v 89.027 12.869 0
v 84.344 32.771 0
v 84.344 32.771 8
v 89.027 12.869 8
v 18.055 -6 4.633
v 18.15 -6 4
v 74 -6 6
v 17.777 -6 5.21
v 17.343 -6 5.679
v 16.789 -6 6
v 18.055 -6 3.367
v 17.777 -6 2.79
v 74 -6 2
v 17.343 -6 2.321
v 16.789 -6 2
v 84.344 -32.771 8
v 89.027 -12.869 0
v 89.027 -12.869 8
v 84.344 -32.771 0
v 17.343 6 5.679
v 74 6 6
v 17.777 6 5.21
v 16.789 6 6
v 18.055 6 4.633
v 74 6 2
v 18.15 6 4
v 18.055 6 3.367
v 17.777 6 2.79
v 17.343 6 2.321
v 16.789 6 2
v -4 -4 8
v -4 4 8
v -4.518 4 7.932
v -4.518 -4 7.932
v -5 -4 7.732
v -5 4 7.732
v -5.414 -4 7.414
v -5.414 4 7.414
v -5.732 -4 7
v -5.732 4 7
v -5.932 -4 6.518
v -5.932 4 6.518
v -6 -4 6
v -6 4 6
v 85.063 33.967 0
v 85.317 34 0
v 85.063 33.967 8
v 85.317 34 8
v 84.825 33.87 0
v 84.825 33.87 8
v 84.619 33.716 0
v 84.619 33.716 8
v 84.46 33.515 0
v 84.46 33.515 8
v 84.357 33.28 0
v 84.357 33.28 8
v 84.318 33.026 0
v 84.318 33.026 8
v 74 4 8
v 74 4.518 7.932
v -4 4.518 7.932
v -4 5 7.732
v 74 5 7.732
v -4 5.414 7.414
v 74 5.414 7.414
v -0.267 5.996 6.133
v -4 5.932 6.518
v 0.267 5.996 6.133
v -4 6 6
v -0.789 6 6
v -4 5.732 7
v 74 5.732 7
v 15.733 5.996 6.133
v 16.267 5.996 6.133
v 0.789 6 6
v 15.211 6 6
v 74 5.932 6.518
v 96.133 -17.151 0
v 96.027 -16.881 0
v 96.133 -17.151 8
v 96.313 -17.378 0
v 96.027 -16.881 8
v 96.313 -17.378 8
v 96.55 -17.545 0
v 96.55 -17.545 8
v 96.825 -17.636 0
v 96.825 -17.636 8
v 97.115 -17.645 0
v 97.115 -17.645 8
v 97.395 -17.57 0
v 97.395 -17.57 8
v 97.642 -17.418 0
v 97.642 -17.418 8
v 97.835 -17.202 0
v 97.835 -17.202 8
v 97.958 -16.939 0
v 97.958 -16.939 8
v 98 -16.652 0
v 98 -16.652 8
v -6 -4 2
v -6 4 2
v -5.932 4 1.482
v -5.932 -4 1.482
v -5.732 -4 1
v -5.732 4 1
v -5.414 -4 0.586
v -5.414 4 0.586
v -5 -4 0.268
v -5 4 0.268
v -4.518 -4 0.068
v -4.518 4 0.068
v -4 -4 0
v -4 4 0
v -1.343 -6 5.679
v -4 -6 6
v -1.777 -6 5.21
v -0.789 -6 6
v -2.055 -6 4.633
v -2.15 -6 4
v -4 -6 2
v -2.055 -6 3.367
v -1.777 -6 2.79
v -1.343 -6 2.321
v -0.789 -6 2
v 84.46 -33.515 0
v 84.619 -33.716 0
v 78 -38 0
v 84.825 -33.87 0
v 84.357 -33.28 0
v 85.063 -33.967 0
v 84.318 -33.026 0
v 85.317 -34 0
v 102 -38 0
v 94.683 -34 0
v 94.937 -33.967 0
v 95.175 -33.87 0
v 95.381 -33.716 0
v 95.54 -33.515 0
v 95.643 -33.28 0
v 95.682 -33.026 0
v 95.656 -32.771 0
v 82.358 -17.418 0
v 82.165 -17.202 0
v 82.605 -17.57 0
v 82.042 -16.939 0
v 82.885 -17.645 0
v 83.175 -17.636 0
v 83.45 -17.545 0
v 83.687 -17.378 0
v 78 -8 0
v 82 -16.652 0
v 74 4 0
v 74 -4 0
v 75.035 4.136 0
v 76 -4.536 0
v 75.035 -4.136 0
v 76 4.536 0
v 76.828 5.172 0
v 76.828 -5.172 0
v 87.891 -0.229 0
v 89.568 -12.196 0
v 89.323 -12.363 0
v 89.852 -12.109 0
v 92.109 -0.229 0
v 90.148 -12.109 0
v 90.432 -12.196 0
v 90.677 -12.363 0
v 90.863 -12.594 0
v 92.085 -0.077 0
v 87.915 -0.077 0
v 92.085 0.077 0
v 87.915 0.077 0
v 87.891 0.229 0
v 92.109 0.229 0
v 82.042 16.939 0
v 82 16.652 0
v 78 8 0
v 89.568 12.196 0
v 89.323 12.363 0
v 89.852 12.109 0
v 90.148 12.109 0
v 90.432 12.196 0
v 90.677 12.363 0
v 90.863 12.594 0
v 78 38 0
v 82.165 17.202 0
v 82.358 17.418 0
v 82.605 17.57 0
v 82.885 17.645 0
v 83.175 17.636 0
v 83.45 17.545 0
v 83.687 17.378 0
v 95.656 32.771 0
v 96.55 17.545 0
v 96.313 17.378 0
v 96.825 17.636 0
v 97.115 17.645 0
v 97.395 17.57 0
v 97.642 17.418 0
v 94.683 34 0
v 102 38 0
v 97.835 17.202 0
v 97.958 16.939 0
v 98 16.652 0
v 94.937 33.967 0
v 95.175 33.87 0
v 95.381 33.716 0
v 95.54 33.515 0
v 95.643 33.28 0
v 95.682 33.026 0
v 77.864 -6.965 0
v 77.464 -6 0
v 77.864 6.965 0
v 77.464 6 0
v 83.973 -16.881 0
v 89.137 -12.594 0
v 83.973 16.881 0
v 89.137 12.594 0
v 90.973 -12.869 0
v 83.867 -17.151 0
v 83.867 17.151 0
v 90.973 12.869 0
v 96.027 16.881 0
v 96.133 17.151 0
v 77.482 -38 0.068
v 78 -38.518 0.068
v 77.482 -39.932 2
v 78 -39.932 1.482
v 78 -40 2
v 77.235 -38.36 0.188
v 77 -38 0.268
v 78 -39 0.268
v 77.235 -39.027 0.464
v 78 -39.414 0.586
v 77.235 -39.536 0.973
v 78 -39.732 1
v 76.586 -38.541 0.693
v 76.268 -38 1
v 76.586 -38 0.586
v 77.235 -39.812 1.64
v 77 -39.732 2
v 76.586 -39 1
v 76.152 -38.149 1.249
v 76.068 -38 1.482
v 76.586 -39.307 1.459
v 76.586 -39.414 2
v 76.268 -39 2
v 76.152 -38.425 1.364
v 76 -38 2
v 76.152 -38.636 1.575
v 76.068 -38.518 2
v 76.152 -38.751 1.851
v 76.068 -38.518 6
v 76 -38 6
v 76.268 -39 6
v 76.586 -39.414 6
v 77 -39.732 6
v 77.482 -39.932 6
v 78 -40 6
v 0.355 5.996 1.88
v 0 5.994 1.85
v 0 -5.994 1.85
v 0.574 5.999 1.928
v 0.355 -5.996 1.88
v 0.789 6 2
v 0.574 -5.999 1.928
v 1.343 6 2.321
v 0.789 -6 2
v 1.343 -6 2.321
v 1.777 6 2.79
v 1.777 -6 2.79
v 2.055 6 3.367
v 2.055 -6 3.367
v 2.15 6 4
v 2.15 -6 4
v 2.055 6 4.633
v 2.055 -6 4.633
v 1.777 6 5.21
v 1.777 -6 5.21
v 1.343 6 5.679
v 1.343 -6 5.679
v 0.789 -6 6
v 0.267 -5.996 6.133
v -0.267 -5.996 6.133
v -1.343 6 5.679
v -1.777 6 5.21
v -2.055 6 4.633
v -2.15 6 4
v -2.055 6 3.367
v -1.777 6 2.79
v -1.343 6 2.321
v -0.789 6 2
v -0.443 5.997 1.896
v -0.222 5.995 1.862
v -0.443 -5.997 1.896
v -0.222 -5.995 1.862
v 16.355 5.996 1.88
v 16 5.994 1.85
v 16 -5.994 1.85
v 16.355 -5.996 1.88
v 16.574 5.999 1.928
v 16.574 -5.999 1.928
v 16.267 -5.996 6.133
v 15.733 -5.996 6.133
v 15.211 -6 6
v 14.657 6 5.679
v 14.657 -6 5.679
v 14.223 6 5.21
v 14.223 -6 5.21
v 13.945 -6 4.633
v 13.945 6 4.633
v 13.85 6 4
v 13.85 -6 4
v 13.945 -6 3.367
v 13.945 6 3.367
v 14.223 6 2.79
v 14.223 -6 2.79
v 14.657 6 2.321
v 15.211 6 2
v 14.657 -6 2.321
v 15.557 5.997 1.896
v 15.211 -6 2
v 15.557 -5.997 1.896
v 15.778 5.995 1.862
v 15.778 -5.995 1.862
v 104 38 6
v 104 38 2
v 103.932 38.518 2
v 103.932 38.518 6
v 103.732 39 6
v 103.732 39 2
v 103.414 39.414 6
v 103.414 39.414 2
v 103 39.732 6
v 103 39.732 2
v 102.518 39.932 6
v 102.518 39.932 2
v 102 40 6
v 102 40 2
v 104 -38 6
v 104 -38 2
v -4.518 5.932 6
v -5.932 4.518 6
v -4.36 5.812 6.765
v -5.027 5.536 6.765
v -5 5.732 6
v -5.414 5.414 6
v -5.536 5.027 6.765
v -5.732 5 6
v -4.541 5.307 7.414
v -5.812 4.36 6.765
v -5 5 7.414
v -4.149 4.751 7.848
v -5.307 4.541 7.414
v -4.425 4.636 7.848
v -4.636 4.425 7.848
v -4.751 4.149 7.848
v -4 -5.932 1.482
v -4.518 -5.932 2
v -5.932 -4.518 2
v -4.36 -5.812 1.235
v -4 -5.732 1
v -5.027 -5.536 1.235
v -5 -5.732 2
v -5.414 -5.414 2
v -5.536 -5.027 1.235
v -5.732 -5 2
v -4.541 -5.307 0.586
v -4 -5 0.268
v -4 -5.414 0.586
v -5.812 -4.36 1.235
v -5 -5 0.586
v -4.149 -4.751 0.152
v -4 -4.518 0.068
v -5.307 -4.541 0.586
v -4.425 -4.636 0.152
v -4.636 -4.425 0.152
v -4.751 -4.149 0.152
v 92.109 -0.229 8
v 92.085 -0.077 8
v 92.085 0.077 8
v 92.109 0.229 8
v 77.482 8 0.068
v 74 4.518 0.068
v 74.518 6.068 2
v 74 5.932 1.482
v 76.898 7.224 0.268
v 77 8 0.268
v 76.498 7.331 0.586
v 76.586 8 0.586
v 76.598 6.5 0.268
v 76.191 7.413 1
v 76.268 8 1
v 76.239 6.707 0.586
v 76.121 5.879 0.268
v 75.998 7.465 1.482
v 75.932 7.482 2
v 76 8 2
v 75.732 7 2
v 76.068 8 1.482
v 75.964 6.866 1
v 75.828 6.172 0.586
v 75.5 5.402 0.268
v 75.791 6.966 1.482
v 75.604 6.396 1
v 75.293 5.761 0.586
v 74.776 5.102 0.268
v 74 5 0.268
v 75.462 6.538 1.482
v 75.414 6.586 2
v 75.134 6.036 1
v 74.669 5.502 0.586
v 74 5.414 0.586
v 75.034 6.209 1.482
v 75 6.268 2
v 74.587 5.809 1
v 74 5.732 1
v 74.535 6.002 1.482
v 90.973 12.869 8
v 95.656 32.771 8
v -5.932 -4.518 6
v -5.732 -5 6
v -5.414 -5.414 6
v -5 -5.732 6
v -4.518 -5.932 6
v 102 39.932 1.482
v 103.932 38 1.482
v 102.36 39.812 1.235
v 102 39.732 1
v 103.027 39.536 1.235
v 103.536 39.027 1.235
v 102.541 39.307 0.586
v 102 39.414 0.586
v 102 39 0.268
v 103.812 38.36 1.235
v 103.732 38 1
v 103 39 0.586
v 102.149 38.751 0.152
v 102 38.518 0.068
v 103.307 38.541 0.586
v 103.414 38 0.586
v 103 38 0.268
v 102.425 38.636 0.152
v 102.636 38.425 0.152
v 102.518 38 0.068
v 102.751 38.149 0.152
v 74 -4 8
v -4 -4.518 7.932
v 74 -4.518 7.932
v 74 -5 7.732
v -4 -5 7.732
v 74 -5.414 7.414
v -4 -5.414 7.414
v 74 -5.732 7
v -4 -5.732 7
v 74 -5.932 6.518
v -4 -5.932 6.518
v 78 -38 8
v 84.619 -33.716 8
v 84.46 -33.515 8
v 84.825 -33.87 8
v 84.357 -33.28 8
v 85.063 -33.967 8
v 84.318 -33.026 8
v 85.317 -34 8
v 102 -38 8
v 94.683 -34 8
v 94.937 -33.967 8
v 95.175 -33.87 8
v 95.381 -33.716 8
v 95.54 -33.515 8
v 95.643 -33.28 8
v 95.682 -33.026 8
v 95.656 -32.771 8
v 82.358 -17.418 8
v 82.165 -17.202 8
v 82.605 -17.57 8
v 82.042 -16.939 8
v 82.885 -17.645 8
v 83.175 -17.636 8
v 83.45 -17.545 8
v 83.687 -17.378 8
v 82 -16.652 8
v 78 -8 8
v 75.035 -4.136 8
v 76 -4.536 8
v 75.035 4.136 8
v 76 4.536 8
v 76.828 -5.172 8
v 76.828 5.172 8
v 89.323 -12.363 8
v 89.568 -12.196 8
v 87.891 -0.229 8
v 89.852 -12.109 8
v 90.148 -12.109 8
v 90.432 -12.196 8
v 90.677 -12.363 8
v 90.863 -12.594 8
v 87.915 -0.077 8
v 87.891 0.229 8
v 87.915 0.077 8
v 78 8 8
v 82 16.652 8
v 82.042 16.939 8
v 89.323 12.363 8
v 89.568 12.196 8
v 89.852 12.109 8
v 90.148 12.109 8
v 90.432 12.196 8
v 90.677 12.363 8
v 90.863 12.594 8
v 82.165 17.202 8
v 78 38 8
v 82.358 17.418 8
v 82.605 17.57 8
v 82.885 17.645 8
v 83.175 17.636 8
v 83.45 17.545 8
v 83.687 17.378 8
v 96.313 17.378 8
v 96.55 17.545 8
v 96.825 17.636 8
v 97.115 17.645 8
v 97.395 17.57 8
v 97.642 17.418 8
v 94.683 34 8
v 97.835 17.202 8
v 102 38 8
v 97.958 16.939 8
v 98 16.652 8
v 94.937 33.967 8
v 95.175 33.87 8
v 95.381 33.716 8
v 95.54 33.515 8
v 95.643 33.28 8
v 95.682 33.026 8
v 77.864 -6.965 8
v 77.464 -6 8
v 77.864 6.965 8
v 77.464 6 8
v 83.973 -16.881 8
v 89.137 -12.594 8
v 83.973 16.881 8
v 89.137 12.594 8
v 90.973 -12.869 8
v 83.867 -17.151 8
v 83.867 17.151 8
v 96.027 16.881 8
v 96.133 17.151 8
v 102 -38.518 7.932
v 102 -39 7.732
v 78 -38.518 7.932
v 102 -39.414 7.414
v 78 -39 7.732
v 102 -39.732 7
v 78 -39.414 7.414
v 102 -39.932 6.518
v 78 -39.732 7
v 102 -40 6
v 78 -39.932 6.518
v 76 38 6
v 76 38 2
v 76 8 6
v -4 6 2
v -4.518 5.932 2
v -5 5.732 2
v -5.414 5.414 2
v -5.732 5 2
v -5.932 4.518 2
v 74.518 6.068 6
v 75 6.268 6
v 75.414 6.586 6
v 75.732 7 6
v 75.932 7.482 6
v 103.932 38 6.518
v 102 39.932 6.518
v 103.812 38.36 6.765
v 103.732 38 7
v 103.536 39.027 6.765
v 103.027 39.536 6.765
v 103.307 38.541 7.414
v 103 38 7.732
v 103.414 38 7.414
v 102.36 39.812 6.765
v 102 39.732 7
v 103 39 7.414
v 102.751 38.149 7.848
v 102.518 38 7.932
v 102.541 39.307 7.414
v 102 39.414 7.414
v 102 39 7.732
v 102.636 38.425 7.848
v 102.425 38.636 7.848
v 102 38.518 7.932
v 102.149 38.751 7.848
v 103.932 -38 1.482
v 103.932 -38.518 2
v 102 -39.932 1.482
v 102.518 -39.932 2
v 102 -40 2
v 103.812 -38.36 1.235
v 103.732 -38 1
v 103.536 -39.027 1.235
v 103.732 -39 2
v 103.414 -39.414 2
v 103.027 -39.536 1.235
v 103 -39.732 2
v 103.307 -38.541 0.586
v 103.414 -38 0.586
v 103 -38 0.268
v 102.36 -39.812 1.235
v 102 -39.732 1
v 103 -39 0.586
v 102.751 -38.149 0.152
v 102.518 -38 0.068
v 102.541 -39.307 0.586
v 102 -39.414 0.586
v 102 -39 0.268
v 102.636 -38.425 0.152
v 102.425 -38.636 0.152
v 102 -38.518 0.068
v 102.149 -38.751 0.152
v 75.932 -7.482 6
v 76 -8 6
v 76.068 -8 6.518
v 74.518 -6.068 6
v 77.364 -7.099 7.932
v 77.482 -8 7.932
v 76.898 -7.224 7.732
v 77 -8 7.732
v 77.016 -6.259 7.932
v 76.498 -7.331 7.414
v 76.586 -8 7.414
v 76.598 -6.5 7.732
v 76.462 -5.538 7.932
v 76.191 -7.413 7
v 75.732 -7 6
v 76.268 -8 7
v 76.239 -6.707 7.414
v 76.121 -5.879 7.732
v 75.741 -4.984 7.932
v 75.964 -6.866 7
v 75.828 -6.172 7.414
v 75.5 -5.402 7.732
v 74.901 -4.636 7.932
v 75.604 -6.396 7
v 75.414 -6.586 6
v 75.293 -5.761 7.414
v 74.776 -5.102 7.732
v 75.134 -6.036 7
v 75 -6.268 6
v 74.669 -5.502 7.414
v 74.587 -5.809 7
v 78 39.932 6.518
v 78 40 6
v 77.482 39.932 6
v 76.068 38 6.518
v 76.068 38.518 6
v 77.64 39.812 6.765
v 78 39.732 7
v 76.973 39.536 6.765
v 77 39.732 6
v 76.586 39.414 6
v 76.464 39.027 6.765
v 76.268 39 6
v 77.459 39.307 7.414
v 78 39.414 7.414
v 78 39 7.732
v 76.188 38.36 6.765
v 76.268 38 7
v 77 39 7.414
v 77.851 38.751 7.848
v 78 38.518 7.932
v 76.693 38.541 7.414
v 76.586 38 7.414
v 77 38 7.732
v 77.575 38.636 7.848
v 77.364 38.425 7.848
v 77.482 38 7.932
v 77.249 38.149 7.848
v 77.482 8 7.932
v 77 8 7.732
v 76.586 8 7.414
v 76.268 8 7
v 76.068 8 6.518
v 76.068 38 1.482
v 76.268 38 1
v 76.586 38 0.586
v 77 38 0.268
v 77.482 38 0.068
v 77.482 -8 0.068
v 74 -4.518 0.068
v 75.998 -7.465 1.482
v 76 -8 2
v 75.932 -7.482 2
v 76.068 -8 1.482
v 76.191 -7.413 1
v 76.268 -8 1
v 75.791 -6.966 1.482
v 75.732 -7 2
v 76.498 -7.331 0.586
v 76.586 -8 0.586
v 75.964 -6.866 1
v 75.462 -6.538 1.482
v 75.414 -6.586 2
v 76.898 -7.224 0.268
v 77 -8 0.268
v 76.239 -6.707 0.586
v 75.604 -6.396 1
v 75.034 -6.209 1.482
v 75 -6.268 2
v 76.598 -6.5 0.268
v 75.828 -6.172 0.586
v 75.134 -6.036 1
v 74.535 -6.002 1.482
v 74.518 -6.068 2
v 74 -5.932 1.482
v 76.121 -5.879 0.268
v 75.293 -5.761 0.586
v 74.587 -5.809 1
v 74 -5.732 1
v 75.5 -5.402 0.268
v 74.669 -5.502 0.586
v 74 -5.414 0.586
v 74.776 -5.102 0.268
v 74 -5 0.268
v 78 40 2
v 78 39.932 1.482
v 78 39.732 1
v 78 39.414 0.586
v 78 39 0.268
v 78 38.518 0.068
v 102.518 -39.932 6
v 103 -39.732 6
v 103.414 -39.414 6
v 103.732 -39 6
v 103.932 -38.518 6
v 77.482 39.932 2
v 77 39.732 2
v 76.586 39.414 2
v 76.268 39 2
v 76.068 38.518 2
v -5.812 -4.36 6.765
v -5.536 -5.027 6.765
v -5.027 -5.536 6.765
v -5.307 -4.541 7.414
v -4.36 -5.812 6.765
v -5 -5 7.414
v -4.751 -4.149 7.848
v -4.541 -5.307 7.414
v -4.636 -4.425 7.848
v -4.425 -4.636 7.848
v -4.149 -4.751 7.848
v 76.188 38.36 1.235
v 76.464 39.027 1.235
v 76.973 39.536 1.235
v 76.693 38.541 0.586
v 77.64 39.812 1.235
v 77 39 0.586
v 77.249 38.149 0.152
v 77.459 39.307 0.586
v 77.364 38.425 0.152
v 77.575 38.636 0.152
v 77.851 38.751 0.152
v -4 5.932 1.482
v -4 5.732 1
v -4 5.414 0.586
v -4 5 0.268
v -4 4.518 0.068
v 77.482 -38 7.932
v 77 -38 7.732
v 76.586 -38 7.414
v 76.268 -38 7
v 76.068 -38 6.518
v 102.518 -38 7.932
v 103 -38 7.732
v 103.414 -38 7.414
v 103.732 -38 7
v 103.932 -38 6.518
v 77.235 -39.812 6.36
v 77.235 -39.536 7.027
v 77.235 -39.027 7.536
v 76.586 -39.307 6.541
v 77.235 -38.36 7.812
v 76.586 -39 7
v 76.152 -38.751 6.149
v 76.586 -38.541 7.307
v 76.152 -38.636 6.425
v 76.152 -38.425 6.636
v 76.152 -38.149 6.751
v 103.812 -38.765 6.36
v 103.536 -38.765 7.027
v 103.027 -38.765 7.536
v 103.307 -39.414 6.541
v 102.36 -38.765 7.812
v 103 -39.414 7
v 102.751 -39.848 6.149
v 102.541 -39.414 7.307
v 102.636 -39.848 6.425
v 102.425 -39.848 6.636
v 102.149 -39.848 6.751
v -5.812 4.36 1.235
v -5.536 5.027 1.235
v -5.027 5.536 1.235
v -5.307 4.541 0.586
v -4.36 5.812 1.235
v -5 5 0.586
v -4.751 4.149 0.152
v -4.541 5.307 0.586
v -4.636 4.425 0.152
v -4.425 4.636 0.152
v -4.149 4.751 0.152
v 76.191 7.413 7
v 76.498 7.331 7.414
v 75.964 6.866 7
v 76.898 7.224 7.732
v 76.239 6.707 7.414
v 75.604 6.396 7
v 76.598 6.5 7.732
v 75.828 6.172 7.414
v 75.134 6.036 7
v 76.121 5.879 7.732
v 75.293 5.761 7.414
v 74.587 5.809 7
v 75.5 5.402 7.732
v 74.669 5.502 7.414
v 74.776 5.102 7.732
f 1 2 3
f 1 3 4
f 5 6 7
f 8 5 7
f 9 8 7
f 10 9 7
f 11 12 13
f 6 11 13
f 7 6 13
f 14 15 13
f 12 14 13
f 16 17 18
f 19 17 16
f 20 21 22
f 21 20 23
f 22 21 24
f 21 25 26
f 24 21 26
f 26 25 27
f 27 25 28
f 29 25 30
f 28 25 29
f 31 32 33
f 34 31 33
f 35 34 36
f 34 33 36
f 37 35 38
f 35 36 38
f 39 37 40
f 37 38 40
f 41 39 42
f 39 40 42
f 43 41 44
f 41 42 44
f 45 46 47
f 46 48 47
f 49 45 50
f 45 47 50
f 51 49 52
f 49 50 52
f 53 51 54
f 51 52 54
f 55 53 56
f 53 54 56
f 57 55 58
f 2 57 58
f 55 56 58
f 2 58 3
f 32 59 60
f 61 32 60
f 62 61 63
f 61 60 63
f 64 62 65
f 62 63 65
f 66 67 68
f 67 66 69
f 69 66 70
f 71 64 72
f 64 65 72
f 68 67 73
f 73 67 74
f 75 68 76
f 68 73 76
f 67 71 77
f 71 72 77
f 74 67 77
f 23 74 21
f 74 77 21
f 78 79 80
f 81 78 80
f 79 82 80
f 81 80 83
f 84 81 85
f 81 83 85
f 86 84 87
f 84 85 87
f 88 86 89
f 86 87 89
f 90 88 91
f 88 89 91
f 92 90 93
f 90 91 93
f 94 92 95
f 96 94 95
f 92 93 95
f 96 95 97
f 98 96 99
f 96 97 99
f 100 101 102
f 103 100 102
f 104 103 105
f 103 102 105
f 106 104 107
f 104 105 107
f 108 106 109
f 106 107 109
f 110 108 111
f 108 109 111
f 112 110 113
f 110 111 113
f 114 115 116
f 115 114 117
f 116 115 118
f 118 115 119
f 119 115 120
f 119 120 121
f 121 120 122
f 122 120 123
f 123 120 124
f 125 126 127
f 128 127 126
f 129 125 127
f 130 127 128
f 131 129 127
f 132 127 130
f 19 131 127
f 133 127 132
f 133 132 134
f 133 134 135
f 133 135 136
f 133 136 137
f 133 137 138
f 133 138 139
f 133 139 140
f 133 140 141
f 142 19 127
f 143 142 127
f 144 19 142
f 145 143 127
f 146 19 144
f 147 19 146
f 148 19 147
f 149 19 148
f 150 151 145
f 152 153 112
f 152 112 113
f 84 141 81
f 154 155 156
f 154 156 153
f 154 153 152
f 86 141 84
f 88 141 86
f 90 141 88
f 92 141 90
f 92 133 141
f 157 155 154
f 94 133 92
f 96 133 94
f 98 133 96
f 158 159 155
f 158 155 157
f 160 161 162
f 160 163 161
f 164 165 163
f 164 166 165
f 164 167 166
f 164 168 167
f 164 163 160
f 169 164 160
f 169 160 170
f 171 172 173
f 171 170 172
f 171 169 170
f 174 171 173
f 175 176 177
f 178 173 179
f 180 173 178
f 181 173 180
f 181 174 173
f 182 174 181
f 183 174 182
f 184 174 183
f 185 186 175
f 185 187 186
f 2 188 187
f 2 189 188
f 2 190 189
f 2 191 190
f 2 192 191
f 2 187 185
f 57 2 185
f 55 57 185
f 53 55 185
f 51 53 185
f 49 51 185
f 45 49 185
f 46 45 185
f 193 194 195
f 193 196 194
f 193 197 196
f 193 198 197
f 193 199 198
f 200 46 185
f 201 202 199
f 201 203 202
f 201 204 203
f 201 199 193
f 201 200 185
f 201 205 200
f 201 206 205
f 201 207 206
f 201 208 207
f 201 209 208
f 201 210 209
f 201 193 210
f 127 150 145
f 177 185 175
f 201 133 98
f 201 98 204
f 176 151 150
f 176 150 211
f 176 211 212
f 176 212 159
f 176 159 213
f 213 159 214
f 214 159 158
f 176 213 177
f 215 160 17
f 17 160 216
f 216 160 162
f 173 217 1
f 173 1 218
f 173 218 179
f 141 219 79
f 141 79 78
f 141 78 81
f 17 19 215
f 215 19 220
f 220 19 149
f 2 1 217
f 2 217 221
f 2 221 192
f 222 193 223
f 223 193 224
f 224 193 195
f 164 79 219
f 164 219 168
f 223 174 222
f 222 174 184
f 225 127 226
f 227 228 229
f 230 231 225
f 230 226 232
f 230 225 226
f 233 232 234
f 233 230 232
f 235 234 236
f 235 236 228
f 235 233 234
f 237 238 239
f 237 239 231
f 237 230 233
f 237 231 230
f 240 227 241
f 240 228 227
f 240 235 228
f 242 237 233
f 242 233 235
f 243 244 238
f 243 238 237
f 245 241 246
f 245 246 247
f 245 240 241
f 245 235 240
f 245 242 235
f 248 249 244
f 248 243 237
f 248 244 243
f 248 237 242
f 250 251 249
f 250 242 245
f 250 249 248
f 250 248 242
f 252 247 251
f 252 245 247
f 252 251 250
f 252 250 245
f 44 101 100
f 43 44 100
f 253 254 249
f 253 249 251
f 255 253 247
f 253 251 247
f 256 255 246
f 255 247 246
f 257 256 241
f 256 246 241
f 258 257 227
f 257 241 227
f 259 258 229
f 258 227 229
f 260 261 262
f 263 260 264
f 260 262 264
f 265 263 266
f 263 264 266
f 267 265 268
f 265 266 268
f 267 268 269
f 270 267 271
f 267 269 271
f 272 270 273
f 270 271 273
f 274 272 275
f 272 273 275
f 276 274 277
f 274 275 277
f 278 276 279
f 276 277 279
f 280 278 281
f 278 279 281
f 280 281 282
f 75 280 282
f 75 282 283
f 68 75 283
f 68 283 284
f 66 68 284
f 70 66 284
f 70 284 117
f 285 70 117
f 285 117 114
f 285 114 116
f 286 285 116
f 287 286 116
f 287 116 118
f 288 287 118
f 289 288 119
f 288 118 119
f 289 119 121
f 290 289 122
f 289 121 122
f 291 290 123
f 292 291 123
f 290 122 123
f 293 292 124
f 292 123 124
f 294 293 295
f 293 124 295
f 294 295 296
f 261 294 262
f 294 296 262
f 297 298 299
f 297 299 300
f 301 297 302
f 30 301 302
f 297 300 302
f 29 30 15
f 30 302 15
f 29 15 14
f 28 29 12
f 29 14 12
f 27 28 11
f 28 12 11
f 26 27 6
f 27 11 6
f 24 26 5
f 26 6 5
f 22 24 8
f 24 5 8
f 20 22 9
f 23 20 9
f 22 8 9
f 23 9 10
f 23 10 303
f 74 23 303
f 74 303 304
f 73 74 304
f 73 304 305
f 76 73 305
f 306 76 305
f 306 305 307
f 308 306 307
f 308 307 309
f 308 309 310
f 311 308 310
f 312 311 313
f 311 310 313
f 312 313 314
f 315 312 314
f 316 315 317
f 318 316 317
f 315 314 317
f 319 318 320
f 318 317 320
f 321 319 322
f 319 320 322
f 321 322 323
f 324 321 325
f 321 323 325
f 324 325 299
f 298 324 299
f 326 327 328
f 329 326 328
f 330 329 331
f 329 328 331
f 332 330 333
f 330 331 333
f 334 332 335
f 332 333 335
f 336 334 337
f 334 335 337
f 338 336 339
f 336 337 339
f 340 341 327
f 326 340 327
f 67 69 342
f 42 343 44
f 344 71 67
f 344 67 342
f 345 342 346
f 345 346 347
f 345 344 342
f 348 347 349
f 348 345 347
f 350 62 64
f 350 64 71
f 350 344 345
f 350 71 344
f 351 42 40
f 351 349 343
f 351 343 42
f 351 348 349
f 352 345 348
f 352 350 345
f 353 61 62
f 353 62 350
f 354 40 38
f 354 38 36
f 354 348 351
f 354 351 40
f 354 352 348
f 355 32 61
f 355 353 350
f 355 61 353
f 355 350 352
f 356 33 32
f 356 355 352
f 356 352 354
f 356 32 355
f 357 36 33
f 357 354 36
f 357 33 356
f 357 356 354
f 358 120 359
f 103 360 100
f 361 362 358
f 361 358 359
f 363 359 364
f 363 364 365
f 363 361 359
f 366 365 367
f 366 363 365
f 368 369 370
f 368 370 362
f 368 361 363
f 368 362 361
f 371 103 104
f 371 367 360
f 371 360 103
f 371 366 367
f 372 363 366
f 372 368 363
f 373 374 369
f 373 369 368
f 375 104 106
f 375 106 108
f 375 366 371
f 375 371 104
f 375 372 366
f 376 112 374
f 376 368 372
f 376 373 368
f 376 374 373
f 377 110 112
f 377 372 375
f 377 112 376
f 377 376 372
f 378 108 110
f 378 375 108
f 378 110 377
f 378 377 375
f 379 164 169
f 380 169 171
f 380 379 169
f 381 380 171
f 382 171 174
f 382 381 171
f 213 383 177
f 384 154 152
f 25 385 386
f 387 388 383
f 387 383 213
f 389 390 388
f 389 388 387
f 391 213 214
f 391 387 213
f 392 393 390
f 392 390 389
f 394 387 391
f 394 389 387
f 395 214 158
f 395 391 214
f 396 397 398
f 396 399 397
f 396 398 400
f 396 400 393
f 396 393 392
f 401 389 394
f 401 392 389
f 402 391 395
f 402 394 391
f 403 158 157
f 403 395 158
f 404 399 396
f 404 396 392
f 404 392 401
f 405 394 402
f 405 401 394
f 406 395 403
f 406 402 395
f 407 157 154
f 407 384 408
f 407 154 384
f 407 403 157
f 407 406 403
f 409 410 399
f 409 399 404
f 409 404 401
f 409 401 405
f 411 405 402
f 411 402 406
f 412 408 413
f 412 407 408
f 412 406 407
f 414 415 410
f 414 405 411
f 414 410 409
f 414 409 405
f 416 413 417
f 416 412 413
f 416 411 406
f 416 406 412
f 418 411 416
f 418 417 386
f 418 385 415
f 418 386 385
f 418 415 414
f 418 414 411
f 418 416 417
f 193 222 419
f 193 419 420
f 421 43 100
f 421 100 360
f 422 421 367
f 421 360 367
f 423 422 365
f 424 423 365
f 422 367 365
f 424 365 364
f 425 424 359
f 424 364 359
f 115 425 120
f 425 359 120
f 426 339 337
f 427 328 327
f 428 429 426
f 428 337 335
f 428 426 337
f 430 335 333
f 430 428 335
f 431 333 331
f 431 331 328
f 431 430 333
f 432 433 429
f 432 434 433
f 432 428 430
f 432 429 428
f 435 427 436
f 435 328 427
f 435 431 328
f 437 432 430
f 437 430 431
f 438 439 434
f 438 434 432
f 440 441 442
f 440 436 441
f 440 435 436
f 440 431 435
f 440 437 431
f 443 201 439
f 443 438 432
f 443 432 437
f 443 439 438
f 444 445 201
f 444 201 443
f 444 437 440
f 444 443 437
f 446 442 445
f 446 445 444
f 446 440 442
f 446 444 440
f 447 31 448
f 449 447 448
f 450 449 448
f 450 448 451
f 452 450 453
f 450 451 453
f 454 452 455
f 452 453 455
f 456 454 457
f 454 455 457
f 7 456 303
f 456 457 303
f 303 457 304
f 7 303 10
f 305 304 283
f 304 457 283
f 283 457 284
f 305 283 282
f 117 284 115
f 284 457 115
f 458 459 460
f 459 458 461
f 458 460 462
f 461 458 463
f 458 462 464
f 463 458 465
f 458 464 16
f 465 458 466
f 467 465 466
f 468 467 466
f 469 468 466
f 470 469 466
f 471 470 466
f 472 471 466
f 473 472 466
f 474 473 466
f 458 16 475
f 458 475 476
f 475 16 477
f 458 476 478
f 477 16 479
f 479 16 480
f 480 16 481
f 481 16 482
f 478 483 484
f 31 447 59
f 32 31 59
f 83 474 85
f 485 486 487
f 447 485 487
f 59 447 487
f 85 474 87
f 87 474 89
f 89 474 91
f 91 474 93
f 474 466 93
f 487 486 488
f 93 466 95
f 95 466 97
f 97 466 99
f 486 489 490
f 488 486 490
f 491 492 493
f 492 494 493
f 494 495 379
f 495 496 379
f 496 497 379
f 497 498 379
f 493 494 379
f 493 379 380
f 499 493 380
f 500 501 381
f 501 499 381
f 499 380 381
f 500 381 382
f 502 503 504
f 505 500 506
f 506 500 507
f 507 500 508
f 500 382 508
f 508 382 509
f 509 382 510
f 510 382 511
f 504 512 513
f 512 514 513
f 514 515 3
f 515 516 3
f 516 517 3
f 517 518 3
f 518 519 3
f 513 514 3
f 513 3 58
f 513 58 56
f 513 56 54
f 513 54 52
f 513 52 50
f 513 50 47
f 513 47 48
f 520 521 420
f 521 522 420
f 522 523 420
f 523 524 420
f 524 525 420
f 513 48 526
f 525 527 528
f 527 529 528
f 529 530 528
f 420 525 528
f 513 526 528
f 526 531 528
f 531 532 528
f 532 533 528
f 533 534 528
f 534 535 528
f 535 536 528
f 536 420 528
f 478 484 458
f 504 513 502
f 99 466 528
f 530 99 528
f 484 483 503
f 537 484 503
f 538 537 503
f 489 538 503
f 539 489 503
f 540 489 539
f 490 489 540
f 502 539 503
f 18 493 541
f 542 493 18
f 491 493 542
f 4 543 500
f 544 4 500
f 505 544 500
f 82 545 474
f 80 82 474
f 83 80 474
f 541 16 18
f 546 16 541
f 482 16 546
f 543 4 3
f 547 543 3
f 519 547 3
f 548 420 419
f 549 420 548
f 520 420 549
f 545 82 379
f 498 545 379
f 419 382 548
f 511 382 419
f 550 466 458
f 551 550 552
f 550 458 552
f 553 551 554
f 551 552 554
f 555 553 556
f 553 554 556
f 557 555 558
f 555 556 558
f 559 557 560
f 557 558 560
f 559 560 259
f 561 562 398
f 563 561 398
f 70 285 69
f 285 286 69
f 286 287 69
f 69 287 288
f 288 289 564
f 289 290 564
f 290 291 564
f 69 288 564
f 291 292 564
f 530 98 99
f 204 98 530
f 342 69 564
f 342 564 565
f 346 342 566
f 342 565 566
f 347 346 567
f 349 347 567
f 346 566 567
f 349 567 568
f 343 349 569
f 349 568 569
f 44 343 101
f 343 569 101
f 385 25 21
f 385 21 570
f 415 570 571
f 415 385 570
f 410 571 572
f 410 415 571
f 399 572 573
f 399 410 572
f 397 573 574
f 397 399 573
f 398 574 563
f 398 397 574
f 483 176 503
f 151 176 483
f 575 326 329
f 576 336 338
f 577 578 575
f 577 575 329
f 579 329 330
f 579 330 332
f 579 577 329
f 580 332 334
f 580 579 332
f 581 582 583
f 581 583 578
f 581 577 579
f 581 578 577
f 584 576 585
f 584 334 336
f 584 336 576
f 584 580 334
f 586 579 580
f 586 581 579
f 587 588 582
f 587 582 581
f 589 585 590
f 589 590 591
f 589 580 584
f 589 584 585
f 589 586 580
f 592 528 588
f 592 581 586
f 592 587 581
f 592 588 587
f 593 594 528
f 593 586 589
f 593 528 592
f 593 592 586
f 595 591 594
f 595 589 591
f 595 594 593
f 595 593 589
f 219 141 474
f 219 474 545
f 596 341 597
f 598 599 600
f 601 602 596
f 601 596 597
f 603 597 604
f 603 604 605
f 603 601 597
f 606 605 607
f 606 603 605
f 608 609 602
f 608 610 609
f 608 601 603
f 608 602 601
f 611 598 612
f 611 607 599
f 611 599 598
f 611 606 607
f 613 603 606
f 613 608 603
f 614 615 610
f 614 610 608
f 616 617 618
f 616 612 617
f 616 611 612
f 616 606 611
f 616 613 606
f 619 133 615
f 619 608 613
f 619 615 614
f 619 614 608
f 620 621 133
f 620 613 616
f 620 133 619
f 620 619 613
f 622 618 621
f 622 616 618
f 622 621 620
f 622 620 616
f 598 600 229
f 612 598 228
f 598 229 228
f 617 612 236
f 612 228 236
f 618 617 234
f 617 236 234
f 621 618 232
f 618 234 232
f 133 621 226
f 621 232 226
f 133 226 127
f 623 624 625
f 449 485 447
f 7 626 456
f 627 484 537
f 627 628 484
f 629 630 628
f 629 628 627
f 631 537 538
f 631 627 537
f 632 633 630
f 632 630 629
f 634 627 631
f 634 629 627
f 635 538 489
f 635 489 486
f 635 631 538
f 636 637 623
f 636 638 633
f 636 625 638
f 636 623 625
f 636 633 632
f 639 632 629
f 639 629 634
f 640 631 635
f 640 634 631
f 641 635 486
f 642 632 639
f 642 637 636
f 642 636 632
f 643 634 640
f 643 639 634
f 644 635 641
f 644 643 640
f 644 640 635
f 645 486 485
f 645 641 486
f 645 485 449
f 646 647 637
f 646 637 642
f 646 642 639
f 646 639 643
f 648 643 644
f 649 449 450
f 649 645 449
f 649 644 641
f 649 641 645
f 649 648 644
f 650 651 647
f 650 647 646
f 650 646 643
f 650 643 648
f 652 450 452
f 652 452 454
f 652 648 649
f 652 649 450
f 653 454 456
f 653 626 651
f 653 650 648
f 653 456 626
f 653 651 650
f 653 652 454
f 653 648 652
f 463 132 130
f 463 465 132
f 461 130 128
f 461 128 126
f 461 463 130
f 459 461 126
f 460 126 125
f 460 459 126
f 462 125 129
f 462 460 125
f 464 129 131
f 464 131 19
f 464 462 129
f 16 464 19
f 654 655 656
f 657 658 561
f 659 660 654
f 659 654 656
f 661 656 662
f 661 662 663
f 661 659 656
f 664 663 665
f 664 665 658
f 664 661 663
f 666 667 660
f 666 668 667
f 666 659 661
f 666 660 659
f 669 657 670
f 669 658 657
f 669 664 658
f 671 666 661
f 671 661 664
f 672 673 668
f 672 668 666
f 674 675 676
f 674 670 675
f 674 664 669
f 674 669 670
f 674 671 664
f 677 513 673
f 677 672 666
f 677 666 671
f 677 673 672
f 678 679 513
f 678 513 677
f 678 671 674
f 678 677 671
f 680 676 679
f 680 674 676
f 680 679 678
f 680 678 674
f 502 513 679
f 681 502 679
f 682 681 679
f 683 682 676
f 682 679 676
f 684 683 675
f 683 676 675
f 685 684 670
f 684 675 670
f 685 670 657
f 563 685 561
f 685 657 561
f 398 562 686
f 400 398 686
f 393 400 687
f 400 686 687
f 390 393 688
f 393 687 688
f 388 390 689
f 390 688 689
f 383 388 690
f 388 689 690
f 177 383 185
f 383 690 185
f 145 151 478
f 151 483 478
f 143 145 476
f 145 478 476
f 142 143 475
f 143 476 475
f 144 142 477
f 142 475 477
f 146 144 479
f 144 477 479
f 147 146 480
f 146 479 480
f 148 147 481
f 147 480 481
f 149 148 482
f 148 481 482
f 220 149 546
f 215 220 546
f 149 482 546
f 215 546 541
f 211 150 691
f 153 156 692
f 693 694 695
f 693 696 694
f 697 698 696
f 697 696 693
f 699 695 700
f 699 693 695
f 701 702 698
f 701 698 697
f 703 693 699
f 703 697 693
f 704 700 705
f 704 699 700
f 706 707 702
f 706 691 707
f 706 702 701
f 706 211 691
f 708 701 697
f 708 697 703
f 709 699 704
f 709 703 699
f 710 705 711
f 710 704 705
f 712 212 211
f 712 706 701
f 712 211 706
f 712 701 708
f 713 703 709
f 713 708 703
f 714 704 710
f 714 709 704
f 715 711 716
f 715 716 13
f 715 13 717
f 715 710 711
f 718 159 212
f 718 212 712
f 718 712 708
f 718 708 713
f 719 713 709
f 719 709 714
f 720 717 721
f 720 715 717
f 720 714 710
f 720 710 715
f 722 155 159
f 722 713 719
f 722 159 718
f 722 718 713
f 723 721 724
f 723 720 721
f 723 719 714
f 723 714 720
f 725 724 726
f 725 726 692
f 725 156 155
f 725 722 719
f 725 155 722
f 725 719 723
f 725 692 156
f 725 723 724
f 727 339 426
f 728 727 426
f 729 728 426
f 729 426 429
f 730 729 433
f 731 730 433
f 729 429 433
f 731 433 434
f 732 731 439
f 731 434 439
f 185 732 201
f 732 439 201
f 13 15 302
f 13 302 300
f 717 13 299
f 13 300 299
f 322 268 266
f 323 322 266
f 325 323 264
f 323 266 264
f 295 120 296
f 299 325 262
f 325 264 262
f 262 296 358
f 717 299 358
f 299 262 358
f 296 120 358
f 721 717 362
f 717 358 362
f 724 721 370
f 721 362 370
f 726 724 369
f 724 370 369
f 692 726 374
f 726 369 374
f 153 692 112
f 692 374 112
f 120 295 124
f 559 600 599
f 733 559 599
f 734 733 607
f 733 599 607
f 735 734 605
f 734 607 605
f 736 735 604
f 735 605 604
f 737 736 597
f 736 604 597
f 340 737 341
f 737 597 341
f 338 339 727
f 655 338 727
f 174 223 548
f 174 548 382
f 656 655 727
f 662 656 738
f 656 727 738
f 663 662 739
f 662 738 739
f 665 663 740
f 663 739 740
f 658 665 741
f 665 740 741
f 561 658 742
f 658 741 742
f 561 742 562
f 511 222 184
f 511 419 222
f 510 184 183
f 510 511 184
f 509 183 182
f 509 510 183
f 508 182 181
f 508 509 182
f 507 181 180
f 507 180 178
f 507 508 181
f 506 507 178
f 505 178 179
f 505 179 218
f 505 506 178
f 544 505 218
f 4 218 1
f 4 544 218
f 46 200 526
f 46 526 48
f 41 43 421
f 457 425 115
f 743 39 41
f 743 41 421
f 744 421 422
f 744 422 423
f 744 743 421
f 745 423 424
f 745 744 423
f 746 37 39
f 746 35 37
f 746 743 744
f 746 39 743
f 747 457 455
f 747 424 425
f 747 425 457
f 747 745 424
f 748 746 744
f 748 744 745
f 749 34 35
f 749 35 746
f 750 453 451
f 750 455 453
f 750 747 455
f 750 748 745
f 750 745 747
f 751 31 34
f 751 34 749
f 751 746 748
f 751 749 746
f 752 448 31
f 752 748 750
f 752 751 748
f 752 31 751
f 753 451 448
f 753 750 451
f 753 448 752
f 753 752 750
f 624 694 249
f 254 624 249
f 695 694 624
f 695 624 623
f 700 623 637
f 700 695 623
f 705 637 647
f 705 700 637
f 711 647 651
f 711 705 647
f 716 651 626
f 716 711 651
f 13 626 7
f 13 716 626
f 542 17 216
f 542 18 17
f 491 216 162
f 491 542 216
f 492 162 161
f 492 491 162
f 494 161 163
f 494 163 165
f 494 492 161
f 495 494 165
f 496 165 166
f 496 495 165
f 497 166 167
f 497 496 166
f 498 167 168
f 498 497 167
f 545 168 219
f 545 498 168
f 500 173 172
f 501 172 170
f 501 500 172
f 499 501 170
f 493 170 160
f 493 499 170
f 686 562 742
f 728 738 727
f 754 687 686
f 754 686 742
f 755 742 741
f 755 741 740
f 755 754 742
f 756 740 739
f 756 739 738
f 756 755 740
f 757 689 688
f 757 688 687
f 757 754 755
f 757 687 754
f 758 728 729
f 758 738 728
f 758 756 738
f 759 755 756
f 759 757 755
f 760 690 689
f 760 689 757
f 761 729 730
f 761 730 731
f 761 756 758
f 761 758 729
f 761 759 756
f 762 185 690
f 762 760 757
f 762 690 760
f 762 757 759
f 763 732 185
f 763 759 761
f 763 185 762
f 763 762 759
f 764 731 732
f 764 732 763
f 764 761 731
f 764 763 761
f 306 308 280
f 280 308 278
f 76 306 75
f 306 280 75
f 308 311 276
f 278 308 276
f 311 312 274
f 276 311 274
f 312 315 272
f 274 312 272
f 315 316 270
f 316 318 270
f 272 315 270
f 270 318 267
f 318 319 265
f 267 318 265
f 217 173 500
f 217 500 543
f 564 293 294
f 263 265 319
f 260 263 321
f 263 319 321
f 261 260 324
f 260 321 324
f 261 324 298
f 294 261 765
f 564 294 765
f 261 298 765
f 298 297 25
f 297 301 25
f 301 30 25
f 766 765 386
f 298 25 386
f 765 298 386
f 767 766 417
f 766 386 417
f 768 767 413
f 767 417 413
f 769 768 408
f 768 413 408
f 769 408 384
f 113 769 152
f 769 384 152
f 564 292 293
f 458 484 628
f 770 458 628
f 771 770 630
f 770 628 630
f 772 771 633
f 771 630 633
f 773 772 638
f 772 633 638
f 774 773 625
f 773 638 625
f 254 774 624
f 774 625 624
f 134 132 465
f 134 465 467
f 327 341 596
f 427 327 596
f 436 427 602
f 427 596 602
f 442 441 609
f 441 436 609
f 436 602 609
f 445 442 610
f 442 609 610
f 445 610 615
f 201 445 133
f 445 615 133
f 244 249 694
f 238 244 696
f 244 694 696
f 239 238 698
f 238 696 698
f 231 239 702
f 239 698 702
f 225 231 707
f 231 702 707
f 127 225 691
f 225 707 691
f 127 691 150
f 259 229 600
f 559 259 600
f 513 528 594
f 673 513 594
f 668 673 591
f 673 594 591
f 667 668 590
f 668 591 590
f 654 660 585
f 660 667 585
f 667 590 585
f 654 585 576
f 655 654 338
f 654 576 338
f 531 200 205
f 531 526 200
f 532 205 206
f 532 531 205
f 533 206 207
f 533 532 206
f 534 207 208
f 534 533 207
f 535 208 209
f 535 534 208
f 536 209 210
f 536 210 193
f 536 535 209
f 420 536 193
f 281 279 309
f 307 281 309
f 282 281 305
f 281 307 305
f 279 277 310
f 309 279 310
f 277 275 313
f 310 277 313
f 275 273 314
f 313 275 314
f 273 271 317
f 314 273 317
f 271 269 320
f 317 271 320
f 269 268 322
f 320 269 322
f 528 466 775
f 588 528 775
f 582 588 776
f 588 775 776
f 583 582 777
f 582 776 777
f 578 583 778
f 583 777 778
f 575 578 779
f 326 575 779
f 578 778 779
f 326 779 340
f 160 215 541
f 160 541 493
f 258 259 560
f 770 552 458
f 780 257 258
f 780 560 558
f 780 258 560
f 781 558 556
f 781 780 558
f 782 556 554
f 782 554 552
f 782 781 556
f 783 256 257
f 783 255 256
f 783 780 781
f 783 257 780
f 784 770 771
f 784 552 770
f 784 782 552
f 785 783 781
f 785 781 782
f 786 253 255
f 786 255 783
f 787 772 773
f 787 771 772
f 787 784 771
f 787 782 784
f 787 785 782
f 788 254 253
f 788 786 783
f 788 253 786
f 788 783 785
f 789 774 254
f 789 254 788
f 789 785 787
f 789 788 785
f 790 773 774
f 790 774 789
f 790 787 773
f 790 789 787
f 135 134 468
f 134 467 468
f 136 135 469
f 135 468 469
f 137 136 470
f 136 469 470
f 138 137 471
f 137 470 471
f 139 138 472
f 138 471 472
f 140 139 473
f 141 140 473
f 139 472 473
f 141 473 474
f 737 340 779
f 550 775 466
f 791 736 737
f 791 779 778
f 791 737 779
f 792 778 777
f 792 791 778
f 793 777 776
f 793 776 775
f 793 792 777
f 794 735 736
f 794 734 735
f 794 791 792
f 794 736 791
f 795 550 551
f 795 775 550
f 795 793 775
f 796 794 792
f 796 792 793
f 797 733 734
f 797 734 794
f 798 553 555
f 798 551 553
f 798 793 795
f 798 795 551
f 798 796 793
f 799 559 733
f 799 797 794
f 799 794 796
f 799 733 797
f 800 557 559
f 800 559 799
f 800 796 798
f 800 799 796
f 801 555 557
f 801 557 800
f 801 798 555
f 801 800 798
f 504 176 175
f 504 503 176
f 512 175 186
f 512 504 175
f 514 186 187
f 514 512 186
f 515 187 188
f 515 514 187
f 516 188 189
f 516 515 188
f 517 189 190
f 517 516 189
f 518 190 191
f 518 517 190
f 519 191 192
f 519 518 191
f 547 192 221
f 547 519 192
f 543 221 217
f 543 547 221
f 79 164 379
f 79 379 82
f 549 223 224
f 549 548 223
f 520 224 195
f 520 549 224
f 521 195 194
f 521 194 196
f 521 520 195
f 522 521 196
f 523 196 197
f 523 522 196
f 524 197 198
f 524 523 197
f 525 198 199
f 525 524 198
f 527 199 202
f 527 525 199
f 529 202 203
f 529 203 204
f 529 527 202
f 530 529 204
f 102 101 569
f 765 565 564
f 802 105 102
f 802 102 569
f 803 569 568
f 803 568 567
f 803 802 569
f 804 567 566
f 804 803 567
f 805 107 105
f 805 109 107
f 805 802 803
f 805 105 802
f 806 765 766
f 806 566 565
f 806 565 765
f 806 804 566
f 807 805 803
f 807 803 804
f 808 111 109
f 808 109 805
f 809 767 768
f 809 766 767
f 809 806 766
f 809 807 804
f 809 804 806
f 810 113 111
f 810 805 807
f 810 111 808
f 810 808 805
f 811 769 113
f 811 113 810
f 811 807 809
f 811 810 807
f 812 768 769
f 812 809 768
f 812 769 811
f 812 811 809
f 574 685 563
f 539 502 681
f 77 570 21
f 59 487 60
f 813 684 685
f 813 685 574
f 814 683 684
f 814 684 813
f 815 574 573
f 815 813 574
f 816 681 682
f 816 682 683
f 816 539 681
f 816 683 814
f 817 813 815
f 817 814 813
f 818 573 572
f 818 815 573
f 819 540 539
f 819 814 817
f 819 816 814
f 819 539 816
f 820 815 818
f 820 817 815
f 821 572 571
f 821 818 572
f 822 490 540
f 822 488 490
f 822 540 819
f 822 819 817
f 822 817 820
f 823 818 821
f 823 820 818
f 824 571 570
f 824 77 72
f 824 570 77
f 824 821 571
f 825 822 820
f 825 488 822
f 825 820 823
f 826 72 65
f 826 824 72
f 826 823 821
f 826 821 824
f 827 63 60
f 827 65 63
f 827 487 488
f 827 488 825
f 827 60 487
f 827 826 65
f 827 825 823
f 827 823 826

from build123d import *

# Parameters (mm, degrees)
BOSS_EXTRUDE1_DEPTH = 8
SKETCH2_R           = 2.15
CUT_EXTRUDE1_DEPTH  = 18
FILLET1_R           = 2
FILLET2_R           = 1


with BuildPart() as part:
    # Sketch1 → Boss-Extrude1 (new body)
    with BuildSketch(Plane.XY):
        Polygon((76, -6), (76, -40), (104, -40), (104, 40), (76, 40), (76, 6), (-6, 6), (-6, -6), align=None)
        Polygon((84.054617553, 34), (90, 8.732124598), (95.945382447, 34), align=None, mode=Mode.SUBTRACT)
        Polygon((82, 25.267875402), (82, -25.267875402), (87.945382447, 0), align=None, mode=Mode.SUBTRACT)
        Polygon((98, 25.267875402), (92.054617553, 0), (98, -25.267875402), align=None, mode=Mode.SUBTRACT)
        Polygon((84.054617553, -34), (95.945382447, -34), (90, -8.732124598), align=None, mode=Mode.SUBTRACT)
    extrude(amount=BOSS_EXTRUDE1_DEPTH)

    # Sketch2 → Cut-Extrude1 (cut)
    with BuildSketch(Plane.XZ.offset(6)):
        with Locations(Location((0, 4, 0), (0, 0, 270))):
            Circle(SKETCH2_R)
        with Locations(Location((16, 4, 0), (0, 0, 270))):
            Circle(SKETCH2_R)
    extrude(amount=-CUT_EXTRUDE1_DEPTH, mode=Mode.SUBTRACT)

    # Fillet1
    # the kernel refuses this fillet: 2 mm, written as the material it adds along each edge
    with BuildSketch(Plane(origin=(76, 6, 0), x_dir=(0, 1, 0), z_dir=(0, 0, 1))) as fillet1_piece_1:
        with BuildLine():
            CenterArc((FILLET1_R, FILLET1_R), FILLET1_R, 180, 90)
            Line((0, FILLET1_R), (0, 0))
            Line((0, 0), (FILLET1_R, 0))
        make_face()
    extrude(amount=8)
    with BuildSketch(Plane(origin=(76, -6, 0), x_dir=(0, -1, 0), z_dir=(0, 0, 1))) as fillet1_piece_2:
        with BuildLine():
            CenterArc((FILLET1_R, -FILLET1_R), FILLET1_R, 90, 90)
            Line((0, -FILLET1_R), (0, 0))
            Line((0, 0), (FILLET1_R, 0))
        make_face()
    extrude(amount=8)
    # the kernel refuses this fillet: 2 mm, written as the material it takes off along each edge
    with BuildSketch(Plane(origin=(102, -38, 2), x_dir=(0, -1, 0), z_dir=(0, 0, -1))) as fillet1_2_piece_1_section:
        Polygon((0, 0), (FILLET1_R, 0), (FILLET1_R, -FILLET1_R), (0, -FILLET1_R), align=None)
    fillet1_2_piece_1 = extrude(amount=FILLET1_R, mode=Mode.PRIVATE)
    fillet1_2_piece_1 = fillet1_2_piece_1 - Plane(origin=(102, -38, 2), x_dir=(-0.7071067811865475, 0.7071067811865475, 0), z_dir=(0, 0, -1)) * Sphere(FILLET1_R, mode=Mode.PRIVATE)
    add(fillet1_2_piece_1, mode=Mode.SUBTRACT)
    with BuildSketch(Plane(origin=(102, 38, 2), x_dir=(1, 0, 0), z_dir=(0, 0, -1))) as fillet1_2_piece_2_section:
        Polygon((0, 0), (FILLET1_R, 0), (FILLET1_R, -FILLET1_R), (0, -FILLET1_R), align=None)
    fillet1_2_piece_2 = extrude(amount=FILLET1_R, mode=Mode.PRIVATE)
    fillet1_2_piece_2 = fillet1_2_piece_2 - Plane(origin=(102, 38, 2), x_dir=(-0.7071067811865475, -0.7071067811865475, 0), z_dir=(0, 0, -1)) * Sphere(FILLET1_R, mode=Mode.PRIVATE)
    add(fillet1_2_piece_2, mode=Mode.SUBTRACT)
    with BuildSketch(Plane(origin=(102, 38, 6), x_dir=(1, 0, 0), z_dir=(0, 0, 1))) as fillet1_2_piece_3_section:
        Polygon((0, 0), (FILLET1_R, 0), (FILLET1_R, FILLET1_R), (0, FILLET1_R), align=None)
    fillet1_2_piece_3 = extrude(amount=FILLET1_R, mode=Mode.PRIVATE)
    fillet1_2_piece_3 = fillet1_2_piece_3 - Plane(origin=(102, 38, 6), x_dir=(-0.7071067811865475, -0.7071067811865475, 0), z_dir=(0, 0, 1)) * Sphere(FILLET1_R, mode=Mode.PRIVATE)
    add(fillet1_2_piece_3, mode=Mode.SUBTRACT)
    with BuildSketch(Plane(origin=(102, -38, 6), x_dir=(0, 0, 1), z_dir=(0, -1, 0))) as fillet1_2_piece_4_section:
        Polygon((0, 0), (FILLET1_R, 0), (FILLET1_R, -FILLET1_R), (0, -FILLET1_R), align=None)
    fillet1_2_piece_4 = extrude(amount=FILLET1_R, mode=Mode.PRIVATE)
    fillet1_2_piece_4 = fillet1_2_piece_4 - Plane(origin=(102, -38, 6), x_dir=(-0.7071067811865475, 0, -0.7071067811865475), z_dir=(0, -1, 0)) * Sphere(FILLET1_R, mode=Mode.PRIVATE)
    add(fillet1_2_piece_4, mode=Mode.SUBTRACT)
    with BuildSketch(Plane(origin=(71, -40, 0), x_dir=(0, 1, 0), z_dir=(1, 0, 0)), Plane(origin=(71, -40, 8), x_dir=(0, 0, -1), z_dir=(1, 0, 0)), Plane(origin=(102, 40, 0), x_dir=(0, -1, 0), z_dir=(-1, 0, 0))) as fillet1_2_piece_5:
        with BuildLine():
            CenterArc((FILLET1_R, FILLET1_R), FILLET1_R, 180, 90)
            Line((0, FILLET1_R), (0, 0))
            Line((0, 0), (FILLET1_R, 0))
        make_face()
    extrude(amount=31, mode=Mode.SUBTRACT)
    with BuildSketch(Plane(origin=(-6, 11, 0), x_dir=(1, 0, 0), z_dir=(0, -1, 0))) as fillet1_2_piece_6:
        with BuildLine():
            CenterArc((FILLET1_R, FILLET1_R), FILLET1_R, 180, 90)
            Line((0, FILLET1_R), (0, 0))
            Line((0, 0), (FILLET1_R, 0))
        make_face()
    extrude(amount=22, mode=Mode.SUBTRACT)
    with BuildSketch(Plane(origin=(-6, 6, -5), x_dir=(1, 0, 0), z_dir=(0, 0, 1)), Plane(origin=(76, 40, -5), x_dir=(1, 0, 0), z_dir=(0, 0, 1)), Plane(origin=(76, -40, -5), x_dir=(0, 1, 0), z_dir=(0, 0, 1)), Plane(origin=(-6, -6, -5), x_dir=(0, 1, 0), z_dir=(0, 0, 1))) as fillet1_2_piece_7:
        with BuildLine():
            CenterArc((FILLET1_R, -FILLET1_R), FILLET1_R, 90, 90)
            Line((0, -FILLET1_R), (0, 0))
            Line((0, 0), (FILLET1_R, 0))
        make_face()
    extrude(amount=18, mode=Mode.SUBTRACT)
    with BuildSketch(Plane(origin=(104, 40, 2), x_dir=(0, -1, 0), z_dir=(0, 0, 1)), Plane(origin=(104, -40, 2), x_dir=(-1, 0, 0), z_dir=(0, 0, 1))) as fillet1_2_piece_8:
        with BuildLine():
            CenterArc((FILLET1_R, -FILLET1_R), FILLET1_R, 90, 90)
            Line((0, -FILLET1_R), (0, 0))
            Line((0, 0), (FILLET1_R, 0))
        make_face()
    extrude(amount=4, mode=Mode.SUBTRACT)
    with BuildSketch(Plane(origin=(104, -38, 8), x_dir=(-1, 0, 0), z_dir=(0, 1, 0))) as fillet1_2_piece_9:
        with BuildLine():
            CenterArc((FILLET1_R, -FILLET1_R), FILLET1_R, 90, 90)
            Line((0, -FILLET1_R), (0, 0))
            Line((0, 0), (FILLET1_R, 0))
        make_face()
    extrude(amount=76, mode=Mode.SUBTRACT)
    with BuildSketch(Plane(origin=(102, 40, 8), x_dir=(0, -1, 0), z_dir=(-1, 0, 0))) as fillet1_2_piece_10:
        with BuildLine():
            CenterArc((FILLET1_R, -FILLET1_R), FILLET1_R, 90, 90)
            Line((0, -FILLET1_R), (0, 0))
            Line((0, 0), (FILLET1_R, 0))
        make_face()
    extrude(amount=31, mode=Mode.SUBTRACT)
    with BuildSketch(Plane(origin=(-6, 11, 8), x_dir=(1, 0, 0), z_dir=(0, -1, 0))) as fillet1_2_piece_11:
        with BuildLine():
            CenterArc((FILLET1_R, -FILLET1_R), FILLET1_R, 90, 90)
            Line((0, -FILLET1_R), (0, 0))
            Line((0, 0), (FILLET1_R, 0))
        make_face()
    extrude(amount=22, mode=Mode.SUBTRACT)
    with BuildSketch(Plane(origin=(104, -38, 0), x_dir=(-1, 0, 0), z_dir=(0, 1, 0))) as fillet1_2_piece_12:
        with BuildLine():
            CenterArc((FILLET1_R, FILLET1_R), FILLET1_R, 180, 90)
            Line((0, FILLET1_R), (0, 0))
            Line((0, 0), (FILLET1_R, 0))
        make_face()
    extrude(amount=76, mode=Mode.SUBTRACT)
    # the kernel refuses this fillet: 2 mm, written as the material it takes off along each edge
    with BuildSketch(Plane(origin=(78, 38, 2), x_dir=(-1, 0, 0), z_dir=(0, 0, -1))) as fillet1_3_piece_1_section:
        Polygon((0, 0), (FILLET1_R, 0), (FILLET1_R, FILLET1_R), (0, FILLET1_R), align=None)
    fillet1_3_piece_1 = extrude(amount=FILLET1_R, mode=Mode.PRIVATE)
    fillet1_3_piece_1 = fillet1_3_piece_1 - Plane(origin=(78, 38, 2), x_dir=(0.7071067811865474, -0.7071067811865477, 0), z_dir=(0, 0, -1)) * Sphere(FILLET1_R, mode=Mode.PRIVATE)
    add(fillet1_3_piece_1, mode=Mode.SUBTRACT)
    with BuildSketch(Plane(origin=(-4, -4, 6), x_dir=(0, -1, 0), z_dir=(0, 0, 1))) as fillet1_3_piece_2_section:
        Polygon((0, 0), (FILLET1_R, 0), (FILLET1_R, -FILLET1_R), (0, -FILLET1_R), align=None)
    fillet1_3_piece_2 = extrude(amount=FILLET1_R, mode=Mode.PRIVATE)
    fillet1_3_piece_2 = fillet1_3_piece_2 - Plane(origin=(-4, -4, 6), x_dir=(0.7071067811865475, 0.7071067811865475, 0), z_dir=(0, 0, 1)) * Sphere(FILLET1_R, mode=Mode.PRIVATE)
    add(fillet1_3_piece_2, mode=Mode.SUBTRACT)
    with BuildSketch(Plane(origin=(-4, 4, 2), x_dir=(0, 1, 0), z_dir=(0, 0, -1))) as fillet1_3_piece_3_section:
        Polygon((0, 0), (FILLET1_R, 0), (FILLET1_R, -FILLET1_R), (0, -FILLET1_R), align=None)
    fillet1_3_piece_3 = extrude(amount=FILLET1_R, mode=Mode.PRIVATE)
    fillet1_3_piece_3 = fillet1_3_piece_3 - Plane(origin=(-4, 4, 2), x_dir=(0.7071067811865475, -0.7071067811865475, 0), z_dir=(0, 0, -1)) * Sphere(FILLET1_R, mode=Mode.PRIVATE)
    add(fillet1_3_piece_3, mode=Mode.SUBTRACT)
    with BuildSketch(Plane(origin=(-4, 4, 6), x_dir=(0, 1, 0), z_dir=(0, 0, 1))) as fillet1_3_piece_4_section:
        Polygon((0, 0), (FILLET1_R, 0), (FILLET1_R, FILLET1_R), (0, FILLET1_R), align=None)
    fillet1_3_piece_4 = extrude(amount=FILLET1_R, mode=Mode.PRIVATE)
    fillet1_3_piece_4 = fillet1_3_piece_4 - Plane(origin=(-4, 4, 6), x_dir=(0.7071067811865475, -0.7071067811865475, 0), z_dir=(0, 0, 1)) * Sphere(FILLET1_R, mode=Mode.PRIVATE)
    add(fillet1_3_piece_4, mode=Mode.SUBTRACT)
    with BuildSketch(Plane(origin=(78, 38, 6), x_dir=(-1, 0, 0), z_dir=(0, 0, 1))) as fillet1_3_piece_5_section:
        Polygon((0, 0), (FILLET1_R, 0), (FILLET1_R, -FILLET1_R), (0, -FILLET1_R), align=None)
    fillet1_3_piece_5 = extrude(amount=FILLET1_R, mode=Mode.PRIVATE)
    fillet1_3_piece_5 = fillet1_3_piece_5 - Plane(origin=(78, 38, 6), x_dir=(0.7071067811865474, -0.7071067811865477, 0), z_dir=(0, 0, 1)) * Sphere(FILLET1_R, mode=Mode.PRIVATE)
    add(fillet1_3_piece_5, mode=Mode.SUBTRACT)
    with BuildSketch(Plane(origin=(78, -38, 6), x_dir=(0, 0, 1), z_dir=(-1, 0, 0))) as fillet1_3_piece_6_section:
        Polygon((0, 0), (FILLET1_R, 0), (FILLET1_R, -FILLET1_R), (0, -FILLET1_R), align=None)
    fillet1_3_piece_6 = extrude(amount=FILLET1_R, mode=Mode.PRIVATE)
    fillet1_3_piece_6 = fillet1_3_piece_6 - Plane(origin=(78, -38, 6), x_dir=(0, 0.7071067811865475, -0.7071067811865475), z_dir=(-1, 0, 0)) * Sphere(FILLET1_R, mode=Mode.PRIVATE)
    add(fillet1_3_piece_6, mode=Mode.SUBTRACT)
    with BuildSketch(Plane(origin=(-4, -4, 2), x_dir=(0, -1, 0), z_dir=(0, 0, -1))) as fillet1_3_piece_7_section:
        Polygon((0, 0), (FILLET1_R, 0), (FILLET1_R, FILLET1_R), (0, FILLET1_R), align=None)
    fillet1_3_piece_7 = extrude(amount=FILLET1_R, mode=Mode.PRIVATE)
    fillet1_3_piece_7 = fillet1_3_piece_7 - Plane(origin=(-4, -4, 2), x_dir=(0.7071067811865475, 0.7071067811865475, 0), z_dir=(0, 0, -1)) * Sphere(FILLET1_R, mode=Mode.PRIVATE)
    add(fillet1_3_piece_7, mode=Mode.SUBTRACT)
    with BuildSketch(Plane(origin=(78, -38, 2), x_dir=(0, 0, -1), z_dir=(-1, 0, 0))) as fillet1_3_piece_8_section:
        Polygon((0, 0), (FILLET1_R, 0), (FILLET1_R, FILLET1_R), (0, FILLET1_R), align=None)
    fillet1_3_piece_8 = extrude(amount=FILLET1_R, mode=Mode.PRIVATE)
    fillet1_3_piece_8 = fillet1_3_piece_8 - Plane(origin=(78, -38, 2), x_dir=(0, 0.7071067811865475, 0.7071067811865475), z_dir=(-1, 0, 0)) * Sphere(FILLET1_R, mode=Mode.PRIVATE)
    add(fillet1_3_piece_8, mode=Mode.SUBTRACT)
    with BuildSketch(Plane(origin=(76, -8, 0), x_dir=(0, 0, 1), z_dir=(0, -1, 0)), Plane(origin=(76, 38, 8), x_dir=(1, 0, 0), z_dir=(0, -1, 0))) as fillet1_3_piece_9:
        with BuildLine():
            CenterArc((FILLET1_R, -FILLET1_R), FILLET1_R, 90, 90)
            Line((0, -FILLET1_R), (0, 0))
            Line((0, 0), (FILLET1_R, 0))
        make_face()
    extrude(amount=30, mode=Mode.SUBTRACT)
    with BuildSketch(Plane(origin=(-4, -6, 0), x_dir=(0, 1, 0), z_dir=(1, 0, 0)), Plane(origin=(74, 6, 0), x_dir=(0, -1, 0), z_dir=(-1, 0, 0))) as fillet1_3_piece_10:
        with BuildLine():
            CenterArc((FILLET1_R, FILLET1_R), FILLET1_R, 180, 90)
            Line((0, FILLET1_R), (0, 0))
            Line((0, 0), (FILLET1_R, 0))
        make_face()
    extrude(amount=78, mode=Mode.SUBTRACT)
    with BuildSketch(Plane(origin=(76, -8, 8), x_dir=(0, 0, -1), z_dir=(0, -1, 0)), Plane(origin=(76, 38, 0), x_dir=(1, 0, 0), z_dir=(0, -1, 0))) as fillet1_3_piece_11:
        with BuildLine():
            CenterArc((FILLET1_R, FILLET1_R), FILLET1_R, 180, 90)
            Line((0, FILLET1_R), (0, 0))
            Line((0, 0), (FILLET1_R, 0))
        make_face()
    extrude(amount=30, mode=Mode.SUBTRACT)
    with BuildSketch(Plane(origin=(74, 6, 8), x_dir=(0, -1, 0), z_dir=(-1, 0, 0)), Plane(origin=(-4, -6, 8), x_dir=(0, 1, 0), z_dir=(1, 0, 0))) as fillet1_3_piece_12:
        with BuildLine():
            CenterArc((FILLET1_R, -FILLET1_R), FILLET1_R, 90, 90)
            Line((0, -FILLET1_R), (0, 0))
            Line((0, 0), (FILLET1_R, 0))
        make_face()
    extrude(amount=78, mode=Mode.SUBTRACT)
    with BuildSketch(Plane(origin=(74, 8, 0), x_dir=(1, 0, 0), z_dir=(0, 1, 0))) as fillet1_3_piece_13:
        with BuildLine():
            CenterArc((2 + FILLET1_R, -FILLET1_R), FILLET1_R, 90, 90)
            Line((2, -FILLET1_R), (2, 0))
            Line((2, 0), (2 + FILLET1_R, 0))
        make_face()
    revolve(axis=Axis((74, 8, 0), (0, 0, -1)), revolution_arc=90, mode=Mode.SUBTRACT)
    with BuildSketch(Plane(origin=(74, -8, 8), x_dir=(1, 0, 0), z_dir=(0, -1, 0))) as fillet1_3_piece_14:
        with BuildLine():
            CenterArc((2 + FILLET1_R, -FILLET1_R), FILLET1_R, 90, 90)
            Line((2, -FILLET1_R), (2, 0))
            Line((2, 0), (2 + FILLET1_R, 0))
        make_face()
    revolve(axis=Axis((74, -8, 8), (0, 0, 1)), revolution_arc=90, mode=Mode.SUBTRACT)
    with BuildSketch(Plane(origin=(74, 8, 8), x_dir=(1, 0, 0), z_dir=(0, 1, 0))) as fillet1_3_piece_15:
        with BuildLine():
            CenterArc((2 + FILLET1_R, FILLET1_R), FILLET1_R, 180, 90)
            Line((2, FILLET1_R), (2, 0))
            Line((2, 0), (2 + FILLET1_R, 0))
        make_face()
    revolve(axis=Axis((74, 8, 8), (0, 0, -1)), revolution_arc=90, mode=Mode.SUBTRACT)
    with BuildSketch(Plane(origin=(74, -8, 0), x_dir=(1, 0, 0), z_dir=(0, -1, 0))) as fillet1_3_piece_16:
        with BuildLine():
            CenterArc((2 + FILLET1_R, FILLET1_R), FILLET1_R, 180, 90)
            Line((2, FILLET1_R), (2, 0))
            Line((2, 0), (2 + FILLET1_R, 0))
        make_face()
    revolve(axis=Axis((74, -8, 0), (0, 0, 1)), revolution_arc=90, mode=Mode.SUBTRACT)

    # Fillet2
    fillet2_edges = [part.edges().sort_by_distance(p)[0] for p in [
        (95.945382447, 34, 4),
        (84.054617553, 34, 4),
        (90, 8.732124598, 4),
        (87.945382447, 0, 4),
        (82, 25.267875402, 4),
        (82, -25.267875402, 4),
        (90, -8.732124598, 4),
        (84.054617553, -34, 4),
        (95.945382447, -34, 4),
        (98, -25.267875402, 4),
        (98, 25.267875402, 4),
        (92.054617553, 0, 4),
    ]]
    fillet(fillet2_edges, radius=FILLET2_R)


solid = part.part
